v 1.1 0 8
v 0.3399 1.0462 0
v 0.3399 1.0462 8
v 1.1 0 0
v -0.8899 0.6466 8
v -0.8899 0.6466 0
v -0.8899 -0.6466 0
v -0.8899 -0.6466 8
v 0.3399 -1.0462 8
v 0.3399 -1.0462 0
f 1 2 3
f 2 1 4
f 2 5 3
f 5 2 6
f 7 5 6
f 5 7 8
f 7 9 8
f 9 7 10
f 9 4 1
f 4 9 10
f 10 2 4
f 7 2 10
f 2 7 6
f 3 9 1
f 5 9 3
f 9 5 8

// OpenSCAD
// part_id: sp4
// name: SP4 press pin
// source_drawing_ids: DRW-056
// units: mm
// revision: 0.1-placeholder
// SPDX-License-Identifier: MIT

module part_sp4(pin_d = 2.2, pin_h = 8) {
    cylinder(d = pin_d, h = pin_h, center = false);
}


// ---- "main guard" ----
// Default to previewing when opened directly:
if (is_undef(__LIB_MODE__)) {
    part_sp4();
}
